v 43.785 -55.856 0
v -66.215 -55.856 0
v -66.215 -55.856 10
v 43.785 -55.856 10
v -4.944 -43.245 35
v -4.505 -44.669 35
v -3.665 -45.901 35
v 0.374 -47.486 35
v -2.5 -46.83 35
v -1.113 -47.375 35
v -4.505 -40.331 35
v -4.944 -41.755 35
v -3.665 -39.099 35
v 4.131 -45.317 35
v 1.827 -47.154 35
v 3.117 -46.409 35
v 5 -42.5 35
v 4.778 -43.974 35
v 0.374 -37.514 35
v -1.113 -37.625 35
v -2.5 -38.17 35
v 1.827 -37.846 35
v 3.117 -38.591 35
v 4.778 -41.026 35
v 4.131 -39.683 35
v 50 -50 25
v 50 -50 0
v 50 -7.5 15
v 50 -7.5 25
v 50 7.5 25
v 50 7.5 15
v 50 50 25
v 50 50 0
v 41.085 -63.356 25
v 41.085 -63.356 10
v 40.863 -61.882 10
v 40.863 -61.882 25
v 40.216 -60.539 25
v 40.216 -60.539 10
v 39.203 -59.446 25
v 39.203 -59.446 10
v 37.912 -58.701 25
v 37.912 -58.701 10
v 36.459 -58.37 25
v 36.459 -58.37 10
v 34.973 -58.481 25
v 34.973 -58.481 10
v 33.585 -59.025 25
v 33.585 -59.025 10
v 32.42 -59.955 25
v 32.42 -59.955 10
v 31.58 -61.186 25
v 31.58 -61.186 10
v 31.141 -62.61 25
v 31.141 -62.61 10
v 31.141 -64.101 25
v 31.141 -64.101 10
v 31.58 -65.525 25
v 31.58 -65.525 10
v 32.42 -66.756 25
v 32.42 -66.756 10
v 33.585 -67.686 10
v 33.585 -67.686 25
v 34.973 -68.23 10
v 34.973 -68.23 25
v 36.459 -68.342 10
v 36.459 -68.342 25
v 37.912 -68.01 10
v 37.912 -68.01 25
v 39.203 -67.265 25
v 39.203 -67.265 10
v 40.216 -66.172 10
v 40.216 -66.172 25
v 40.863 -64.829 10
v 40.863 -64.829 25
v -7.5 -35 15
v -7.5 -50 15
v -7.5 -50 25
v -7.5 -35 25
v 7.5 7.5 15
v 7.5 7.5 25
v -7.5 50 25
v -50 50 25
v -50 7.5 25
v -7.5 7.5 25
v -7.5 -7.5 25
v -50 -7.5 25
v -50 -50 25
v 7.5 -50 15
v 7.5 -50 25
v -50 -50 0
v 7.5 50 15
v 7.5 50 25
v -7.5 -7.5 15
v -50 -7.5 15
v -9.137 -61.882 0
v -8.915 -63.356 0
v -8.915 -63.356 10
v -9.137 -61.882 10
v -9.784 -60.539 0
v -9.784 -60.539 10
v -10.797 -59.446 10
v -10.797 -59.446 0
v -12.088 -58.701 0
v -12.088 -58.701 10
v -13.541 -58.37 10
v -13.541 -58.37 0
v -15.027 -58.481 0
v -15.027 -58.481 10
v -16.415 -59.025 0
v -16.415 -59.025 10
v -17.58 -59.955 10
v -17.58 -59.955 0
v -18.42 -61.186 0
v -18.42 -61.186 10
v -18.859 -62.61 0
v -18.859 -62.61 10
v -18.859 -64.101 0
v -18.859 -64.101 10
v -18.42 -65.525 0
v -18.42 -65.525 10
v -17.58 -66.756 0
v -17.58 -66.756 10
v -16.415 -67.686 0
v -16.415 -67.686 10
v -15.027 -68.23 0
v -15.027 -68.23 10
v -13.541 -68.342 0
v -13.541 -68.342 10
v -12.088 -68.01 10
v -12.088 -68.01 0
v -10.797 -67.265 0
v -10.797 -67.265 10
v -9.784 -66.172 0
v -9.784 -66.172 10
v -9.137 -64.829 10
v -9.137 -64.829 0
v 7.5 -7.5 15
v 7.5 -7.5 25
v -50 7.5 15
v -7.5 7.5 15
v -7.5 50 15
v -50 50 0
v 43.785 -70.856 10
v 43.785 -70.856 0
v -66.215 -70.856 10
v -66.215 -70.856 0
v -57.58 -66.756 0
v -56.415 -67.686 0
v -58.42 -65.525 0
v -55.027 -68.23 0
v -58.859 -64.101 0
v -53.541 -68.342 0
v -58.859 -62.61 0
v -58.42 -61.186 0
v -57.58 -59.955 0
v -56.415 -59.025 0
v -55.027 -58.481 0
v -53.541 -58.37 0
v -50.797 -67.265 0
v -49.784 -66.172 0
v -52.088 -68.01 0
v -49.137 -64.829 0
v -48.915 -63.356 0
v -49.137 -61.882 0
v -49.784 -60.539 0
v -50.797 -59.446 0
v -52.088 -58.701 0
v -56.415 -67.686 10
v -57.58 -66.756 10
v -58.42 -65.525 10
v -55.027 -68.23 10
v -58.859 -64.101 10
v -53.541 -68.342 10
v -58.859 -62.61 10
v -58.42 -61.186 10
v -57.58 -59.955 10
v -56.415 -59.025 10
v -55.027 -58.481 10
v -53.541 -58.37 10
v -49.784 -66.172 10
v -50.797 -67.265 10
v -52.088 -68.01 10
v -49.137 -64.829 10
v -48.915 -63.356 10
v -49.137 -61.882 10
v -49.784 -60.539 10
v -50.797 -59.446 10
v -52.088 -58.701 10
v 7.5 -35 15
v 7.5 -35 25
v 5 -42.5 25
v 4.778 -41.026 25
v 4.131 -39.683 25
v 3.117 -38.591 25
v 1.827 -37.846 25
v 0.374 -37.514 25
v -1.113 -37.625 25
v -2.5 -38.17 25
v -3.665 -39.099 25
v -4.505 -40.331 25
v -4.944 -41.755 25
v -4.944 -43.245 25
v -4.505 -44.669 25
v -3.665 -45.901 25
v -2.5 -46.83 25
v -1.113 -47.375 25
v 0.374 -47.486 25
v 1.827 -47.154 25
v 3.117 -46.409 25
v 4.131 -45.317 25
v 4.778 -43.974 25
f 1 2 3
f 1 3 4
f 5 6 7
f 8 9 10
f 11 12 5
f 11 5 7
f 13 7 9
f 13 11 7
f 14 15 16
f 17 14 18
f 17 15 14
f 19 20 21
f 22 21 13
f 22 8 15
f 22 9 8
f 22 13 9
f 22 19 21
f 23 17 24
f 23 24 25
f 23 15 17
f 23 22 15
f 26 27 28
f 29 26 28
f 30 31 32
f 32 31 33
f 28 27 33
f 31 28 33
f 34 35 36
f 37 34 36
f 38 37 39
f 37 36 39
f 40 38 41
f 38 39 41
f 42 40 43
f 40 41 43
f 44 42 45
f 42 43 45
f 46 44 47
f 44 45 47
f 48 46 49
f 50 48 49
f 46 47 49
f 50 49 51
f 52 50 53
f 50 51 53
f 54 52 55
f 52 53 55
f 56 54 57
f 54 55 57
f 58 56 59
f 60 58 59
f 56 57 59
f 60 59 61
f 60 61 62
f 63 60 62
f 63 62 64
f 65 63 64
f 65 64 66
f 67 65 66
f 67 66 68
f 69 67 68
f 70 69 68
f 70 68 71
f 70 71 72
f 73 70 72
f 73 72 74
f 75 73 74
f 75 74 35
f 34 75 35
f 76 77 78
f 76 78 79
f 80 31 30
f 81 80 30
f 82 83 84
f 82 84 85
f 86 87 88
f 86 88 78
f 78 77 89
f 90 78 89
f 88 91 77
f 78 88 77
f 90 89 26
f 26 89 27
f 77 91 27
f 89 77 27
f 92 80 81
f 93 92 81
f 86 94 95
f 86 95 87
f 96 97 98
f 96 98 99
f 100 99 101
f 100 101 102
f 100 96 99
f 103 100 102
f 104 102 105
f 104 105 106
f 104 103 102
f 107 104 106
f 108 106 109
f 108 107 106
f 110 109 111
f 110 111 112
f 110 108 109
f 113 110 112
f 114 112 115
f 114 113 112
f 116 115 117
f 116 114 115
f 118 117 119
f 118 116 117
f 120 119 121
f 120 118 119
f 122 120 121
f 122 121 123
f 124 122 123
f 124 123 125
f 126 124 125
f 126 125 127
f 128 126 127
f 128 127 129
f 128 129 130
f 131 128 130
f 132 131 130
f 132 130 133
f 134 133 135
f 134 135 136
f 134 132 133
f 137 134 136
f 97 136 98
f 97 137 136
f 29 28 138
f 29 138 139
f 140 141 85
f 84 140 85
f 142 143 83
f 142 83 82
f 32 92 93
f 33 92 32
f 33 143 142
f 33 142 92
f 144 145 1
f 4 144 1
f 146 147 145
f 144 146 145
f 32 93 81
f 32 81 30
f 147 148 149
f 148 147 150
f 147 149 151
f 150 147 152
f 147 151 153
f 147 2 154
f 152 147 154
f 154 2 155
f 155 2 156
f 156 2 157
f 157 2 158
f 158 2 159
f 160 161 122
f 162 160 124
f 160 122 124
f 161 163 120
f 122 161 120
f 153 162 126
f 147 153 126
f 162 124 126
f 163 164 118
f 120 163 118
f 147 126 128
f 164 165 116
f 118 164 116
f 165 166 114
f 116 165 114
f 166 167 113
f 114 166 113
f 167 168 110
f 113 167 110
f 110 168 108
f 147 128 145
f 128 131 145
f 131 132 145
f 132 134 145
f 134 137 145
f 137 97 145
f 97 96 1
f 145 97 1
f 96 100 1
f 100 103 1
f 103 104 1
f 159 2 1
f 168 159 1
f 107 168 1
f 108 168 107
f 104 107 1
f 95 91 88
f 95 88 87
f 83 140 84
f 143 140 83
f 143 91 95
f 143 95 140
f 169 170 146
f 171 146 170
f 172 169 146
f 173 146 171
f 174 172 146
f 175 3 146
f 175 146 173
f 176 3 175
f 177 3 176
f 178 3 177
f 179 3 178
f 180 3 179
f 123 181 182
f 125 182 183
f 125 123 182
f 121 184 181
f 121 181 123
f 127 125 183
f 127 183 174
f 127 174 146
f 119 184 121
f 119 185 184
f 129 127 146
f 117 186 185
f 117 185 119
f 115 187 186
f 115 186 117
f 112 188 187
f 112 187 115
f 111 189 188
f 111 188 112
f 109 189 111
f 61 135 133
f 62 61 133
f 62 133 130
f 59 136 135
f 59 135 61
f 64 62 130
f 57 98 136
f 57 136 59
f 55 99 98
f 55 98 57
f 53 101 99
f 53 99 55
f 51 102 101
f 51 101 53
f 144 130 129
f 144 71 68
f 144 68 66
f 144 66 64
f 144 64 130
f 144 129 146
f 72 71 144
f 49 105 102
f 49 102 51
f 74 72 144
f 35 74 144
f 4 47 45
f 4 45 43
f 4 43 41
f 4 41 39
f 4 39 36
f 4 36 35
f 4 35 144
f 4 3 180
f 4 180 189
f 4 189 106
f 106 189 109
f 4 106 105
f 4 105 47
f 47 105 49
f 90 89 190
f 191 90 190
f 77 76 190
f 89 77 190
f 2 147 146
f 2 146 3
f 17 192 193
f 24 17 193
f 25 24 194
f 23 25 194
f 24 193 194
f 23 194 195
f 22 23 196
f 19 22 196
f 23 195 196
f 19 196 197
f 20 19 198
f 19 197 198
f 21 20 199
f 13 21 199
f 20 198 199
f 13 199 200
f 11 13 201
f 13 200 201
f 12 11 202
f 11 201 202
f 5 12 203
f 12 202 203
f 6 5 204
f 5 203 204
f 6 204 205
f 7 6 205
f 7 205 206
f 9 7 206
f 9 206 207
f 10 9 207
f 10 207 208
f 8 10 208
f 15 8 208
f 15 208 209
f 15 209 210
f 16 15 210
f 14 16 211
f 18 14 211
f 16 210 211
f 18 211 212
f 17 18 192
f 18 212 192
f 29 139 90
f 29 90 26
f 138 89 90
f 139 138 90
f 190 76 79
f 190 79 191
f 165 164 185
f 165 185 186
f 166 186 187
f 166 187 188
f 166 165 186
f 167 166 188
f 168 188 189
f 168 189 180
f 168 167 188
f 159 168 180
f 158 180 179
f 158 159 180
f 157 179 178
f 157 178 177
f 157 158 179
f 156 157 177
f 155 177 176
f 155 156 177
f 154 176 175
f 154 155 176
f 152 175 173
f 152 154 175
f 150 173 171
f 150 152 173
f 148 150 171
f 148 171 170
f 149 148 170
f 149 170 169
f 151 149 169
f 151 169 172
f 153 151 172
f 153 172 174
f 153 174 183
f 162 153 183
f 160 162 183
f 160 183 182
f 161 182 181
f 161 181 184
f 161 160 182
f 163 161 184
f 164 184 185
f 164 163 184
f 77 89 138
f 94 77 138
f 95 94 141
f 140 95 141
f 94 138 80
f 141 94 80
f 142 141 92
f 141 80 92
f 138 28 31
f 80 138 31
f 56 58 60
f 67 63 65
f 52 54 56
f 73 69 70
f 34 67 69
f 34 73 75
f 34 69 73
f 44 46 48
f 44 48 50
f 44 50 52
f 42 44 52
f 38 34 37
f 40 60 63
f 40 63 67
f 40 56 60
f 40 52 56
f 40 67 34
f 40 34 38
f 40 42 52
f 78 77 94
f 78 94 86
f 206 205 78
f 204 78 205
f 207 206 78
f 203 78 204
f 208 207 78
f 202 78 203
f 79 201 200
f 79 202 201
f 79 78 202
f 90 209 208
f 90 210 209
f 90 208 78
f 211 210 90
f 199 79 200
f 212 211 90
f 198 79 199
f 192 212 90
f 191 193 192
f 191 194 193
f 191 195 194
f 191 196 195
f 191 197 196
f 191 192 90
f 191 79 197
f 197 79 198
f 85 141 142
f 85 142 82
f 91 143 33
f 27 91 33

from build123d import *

# Parameters (mm, degrees)
F0_W      = 100
F0_H      = 100
F1_DEPTH  = 25
F2_W      = 15
F2_H      = 20
F3_DEPTH  = 100
F4_W      = 15
F4_H      = 20
F5_DEPTH  = 100
F6_W      = 15
F6_H      = 15
F7_DEPTH  = 10
F8_R      = 5
F9_DEPTH  = 10
F10_W     = 110
F10_H     = 15
F10_R     = 5
F11_DEPTH = 10
F12_DEPTH = 25


with BuildPart() as f1:
    # F0 (on Top) → F1 (new body)
    with BuildSketch(Plane.XY):
        Rectangle(F0_W, F0_H)
    extrude(amount=F1_DEPTH)

    # F2 (on face) → F3 (cut)
    with BuildSketch(Plane.YZ.offset(50)):
        with Locations((0, 25)):
            Rectangle(F2_W, F2_H)
    extrude(amount=-F3_DEPTH, mode=Mode.SUBTRACT)

    # F4 (on face) → F5 (cut)
    with BuildSketch(Plane.XZ.offset(50)):
        with Locations((0, 25)):
            Rectangle(F4_W, F4_H)
    extrude(amount=-F5_DEPTH, mode=Mode.SUBTRACT)


with BuildPart() as f7:
    # F6 (on face) → F7 (new body)
    with BuildSketch(Plane.XY.offset(15)):
        with Locations((0, -42.5)):
            Rectangle(F6_W, F6_H)
    extrude(amount=F7_DEPTH)

    # F8 (on face) → F9 (join)
    with BuildSketch(Plane.XY.offset(25)):
        with Locations((0, -42.5)):
            Circle(F8_R)
    extrude(amount=F9_DEPTH)


with BuildPart() as f11:
    # F10 (on Top) → F11 (new body)
    with BuildSketch(Plane.XY):
        with Locations((-11.21485, -63.355587)):
            Rectangle(F10_W, F10_H)
        with Locations((-13.91485, -63.355587)):
            Circle(F10_R, mode=Mode.SUBTRACT)
        with Locations((-53.91485, -63.355587)):
            Circle(F10_R, mode=Mode.SUBTRACT)
        with Locations((36.08515, -63.355587)):
            Circle(F10_R, mode=Mode.SUBTRACT)
        with Locations((36.08515, -63.355587)):
            Circle(F10_R)
    extrude(amount=F11_DEPTH)

    # F10 (on Top) → F12 (join)
    with BuildSketch(Plane.XY):
        with Locations((36.08515, -63.355587)):
            Circle(F10_R)
    extrude(amount=F12_DEPTH)


solid = Compound([f1.part, f7.part, f11.part])
